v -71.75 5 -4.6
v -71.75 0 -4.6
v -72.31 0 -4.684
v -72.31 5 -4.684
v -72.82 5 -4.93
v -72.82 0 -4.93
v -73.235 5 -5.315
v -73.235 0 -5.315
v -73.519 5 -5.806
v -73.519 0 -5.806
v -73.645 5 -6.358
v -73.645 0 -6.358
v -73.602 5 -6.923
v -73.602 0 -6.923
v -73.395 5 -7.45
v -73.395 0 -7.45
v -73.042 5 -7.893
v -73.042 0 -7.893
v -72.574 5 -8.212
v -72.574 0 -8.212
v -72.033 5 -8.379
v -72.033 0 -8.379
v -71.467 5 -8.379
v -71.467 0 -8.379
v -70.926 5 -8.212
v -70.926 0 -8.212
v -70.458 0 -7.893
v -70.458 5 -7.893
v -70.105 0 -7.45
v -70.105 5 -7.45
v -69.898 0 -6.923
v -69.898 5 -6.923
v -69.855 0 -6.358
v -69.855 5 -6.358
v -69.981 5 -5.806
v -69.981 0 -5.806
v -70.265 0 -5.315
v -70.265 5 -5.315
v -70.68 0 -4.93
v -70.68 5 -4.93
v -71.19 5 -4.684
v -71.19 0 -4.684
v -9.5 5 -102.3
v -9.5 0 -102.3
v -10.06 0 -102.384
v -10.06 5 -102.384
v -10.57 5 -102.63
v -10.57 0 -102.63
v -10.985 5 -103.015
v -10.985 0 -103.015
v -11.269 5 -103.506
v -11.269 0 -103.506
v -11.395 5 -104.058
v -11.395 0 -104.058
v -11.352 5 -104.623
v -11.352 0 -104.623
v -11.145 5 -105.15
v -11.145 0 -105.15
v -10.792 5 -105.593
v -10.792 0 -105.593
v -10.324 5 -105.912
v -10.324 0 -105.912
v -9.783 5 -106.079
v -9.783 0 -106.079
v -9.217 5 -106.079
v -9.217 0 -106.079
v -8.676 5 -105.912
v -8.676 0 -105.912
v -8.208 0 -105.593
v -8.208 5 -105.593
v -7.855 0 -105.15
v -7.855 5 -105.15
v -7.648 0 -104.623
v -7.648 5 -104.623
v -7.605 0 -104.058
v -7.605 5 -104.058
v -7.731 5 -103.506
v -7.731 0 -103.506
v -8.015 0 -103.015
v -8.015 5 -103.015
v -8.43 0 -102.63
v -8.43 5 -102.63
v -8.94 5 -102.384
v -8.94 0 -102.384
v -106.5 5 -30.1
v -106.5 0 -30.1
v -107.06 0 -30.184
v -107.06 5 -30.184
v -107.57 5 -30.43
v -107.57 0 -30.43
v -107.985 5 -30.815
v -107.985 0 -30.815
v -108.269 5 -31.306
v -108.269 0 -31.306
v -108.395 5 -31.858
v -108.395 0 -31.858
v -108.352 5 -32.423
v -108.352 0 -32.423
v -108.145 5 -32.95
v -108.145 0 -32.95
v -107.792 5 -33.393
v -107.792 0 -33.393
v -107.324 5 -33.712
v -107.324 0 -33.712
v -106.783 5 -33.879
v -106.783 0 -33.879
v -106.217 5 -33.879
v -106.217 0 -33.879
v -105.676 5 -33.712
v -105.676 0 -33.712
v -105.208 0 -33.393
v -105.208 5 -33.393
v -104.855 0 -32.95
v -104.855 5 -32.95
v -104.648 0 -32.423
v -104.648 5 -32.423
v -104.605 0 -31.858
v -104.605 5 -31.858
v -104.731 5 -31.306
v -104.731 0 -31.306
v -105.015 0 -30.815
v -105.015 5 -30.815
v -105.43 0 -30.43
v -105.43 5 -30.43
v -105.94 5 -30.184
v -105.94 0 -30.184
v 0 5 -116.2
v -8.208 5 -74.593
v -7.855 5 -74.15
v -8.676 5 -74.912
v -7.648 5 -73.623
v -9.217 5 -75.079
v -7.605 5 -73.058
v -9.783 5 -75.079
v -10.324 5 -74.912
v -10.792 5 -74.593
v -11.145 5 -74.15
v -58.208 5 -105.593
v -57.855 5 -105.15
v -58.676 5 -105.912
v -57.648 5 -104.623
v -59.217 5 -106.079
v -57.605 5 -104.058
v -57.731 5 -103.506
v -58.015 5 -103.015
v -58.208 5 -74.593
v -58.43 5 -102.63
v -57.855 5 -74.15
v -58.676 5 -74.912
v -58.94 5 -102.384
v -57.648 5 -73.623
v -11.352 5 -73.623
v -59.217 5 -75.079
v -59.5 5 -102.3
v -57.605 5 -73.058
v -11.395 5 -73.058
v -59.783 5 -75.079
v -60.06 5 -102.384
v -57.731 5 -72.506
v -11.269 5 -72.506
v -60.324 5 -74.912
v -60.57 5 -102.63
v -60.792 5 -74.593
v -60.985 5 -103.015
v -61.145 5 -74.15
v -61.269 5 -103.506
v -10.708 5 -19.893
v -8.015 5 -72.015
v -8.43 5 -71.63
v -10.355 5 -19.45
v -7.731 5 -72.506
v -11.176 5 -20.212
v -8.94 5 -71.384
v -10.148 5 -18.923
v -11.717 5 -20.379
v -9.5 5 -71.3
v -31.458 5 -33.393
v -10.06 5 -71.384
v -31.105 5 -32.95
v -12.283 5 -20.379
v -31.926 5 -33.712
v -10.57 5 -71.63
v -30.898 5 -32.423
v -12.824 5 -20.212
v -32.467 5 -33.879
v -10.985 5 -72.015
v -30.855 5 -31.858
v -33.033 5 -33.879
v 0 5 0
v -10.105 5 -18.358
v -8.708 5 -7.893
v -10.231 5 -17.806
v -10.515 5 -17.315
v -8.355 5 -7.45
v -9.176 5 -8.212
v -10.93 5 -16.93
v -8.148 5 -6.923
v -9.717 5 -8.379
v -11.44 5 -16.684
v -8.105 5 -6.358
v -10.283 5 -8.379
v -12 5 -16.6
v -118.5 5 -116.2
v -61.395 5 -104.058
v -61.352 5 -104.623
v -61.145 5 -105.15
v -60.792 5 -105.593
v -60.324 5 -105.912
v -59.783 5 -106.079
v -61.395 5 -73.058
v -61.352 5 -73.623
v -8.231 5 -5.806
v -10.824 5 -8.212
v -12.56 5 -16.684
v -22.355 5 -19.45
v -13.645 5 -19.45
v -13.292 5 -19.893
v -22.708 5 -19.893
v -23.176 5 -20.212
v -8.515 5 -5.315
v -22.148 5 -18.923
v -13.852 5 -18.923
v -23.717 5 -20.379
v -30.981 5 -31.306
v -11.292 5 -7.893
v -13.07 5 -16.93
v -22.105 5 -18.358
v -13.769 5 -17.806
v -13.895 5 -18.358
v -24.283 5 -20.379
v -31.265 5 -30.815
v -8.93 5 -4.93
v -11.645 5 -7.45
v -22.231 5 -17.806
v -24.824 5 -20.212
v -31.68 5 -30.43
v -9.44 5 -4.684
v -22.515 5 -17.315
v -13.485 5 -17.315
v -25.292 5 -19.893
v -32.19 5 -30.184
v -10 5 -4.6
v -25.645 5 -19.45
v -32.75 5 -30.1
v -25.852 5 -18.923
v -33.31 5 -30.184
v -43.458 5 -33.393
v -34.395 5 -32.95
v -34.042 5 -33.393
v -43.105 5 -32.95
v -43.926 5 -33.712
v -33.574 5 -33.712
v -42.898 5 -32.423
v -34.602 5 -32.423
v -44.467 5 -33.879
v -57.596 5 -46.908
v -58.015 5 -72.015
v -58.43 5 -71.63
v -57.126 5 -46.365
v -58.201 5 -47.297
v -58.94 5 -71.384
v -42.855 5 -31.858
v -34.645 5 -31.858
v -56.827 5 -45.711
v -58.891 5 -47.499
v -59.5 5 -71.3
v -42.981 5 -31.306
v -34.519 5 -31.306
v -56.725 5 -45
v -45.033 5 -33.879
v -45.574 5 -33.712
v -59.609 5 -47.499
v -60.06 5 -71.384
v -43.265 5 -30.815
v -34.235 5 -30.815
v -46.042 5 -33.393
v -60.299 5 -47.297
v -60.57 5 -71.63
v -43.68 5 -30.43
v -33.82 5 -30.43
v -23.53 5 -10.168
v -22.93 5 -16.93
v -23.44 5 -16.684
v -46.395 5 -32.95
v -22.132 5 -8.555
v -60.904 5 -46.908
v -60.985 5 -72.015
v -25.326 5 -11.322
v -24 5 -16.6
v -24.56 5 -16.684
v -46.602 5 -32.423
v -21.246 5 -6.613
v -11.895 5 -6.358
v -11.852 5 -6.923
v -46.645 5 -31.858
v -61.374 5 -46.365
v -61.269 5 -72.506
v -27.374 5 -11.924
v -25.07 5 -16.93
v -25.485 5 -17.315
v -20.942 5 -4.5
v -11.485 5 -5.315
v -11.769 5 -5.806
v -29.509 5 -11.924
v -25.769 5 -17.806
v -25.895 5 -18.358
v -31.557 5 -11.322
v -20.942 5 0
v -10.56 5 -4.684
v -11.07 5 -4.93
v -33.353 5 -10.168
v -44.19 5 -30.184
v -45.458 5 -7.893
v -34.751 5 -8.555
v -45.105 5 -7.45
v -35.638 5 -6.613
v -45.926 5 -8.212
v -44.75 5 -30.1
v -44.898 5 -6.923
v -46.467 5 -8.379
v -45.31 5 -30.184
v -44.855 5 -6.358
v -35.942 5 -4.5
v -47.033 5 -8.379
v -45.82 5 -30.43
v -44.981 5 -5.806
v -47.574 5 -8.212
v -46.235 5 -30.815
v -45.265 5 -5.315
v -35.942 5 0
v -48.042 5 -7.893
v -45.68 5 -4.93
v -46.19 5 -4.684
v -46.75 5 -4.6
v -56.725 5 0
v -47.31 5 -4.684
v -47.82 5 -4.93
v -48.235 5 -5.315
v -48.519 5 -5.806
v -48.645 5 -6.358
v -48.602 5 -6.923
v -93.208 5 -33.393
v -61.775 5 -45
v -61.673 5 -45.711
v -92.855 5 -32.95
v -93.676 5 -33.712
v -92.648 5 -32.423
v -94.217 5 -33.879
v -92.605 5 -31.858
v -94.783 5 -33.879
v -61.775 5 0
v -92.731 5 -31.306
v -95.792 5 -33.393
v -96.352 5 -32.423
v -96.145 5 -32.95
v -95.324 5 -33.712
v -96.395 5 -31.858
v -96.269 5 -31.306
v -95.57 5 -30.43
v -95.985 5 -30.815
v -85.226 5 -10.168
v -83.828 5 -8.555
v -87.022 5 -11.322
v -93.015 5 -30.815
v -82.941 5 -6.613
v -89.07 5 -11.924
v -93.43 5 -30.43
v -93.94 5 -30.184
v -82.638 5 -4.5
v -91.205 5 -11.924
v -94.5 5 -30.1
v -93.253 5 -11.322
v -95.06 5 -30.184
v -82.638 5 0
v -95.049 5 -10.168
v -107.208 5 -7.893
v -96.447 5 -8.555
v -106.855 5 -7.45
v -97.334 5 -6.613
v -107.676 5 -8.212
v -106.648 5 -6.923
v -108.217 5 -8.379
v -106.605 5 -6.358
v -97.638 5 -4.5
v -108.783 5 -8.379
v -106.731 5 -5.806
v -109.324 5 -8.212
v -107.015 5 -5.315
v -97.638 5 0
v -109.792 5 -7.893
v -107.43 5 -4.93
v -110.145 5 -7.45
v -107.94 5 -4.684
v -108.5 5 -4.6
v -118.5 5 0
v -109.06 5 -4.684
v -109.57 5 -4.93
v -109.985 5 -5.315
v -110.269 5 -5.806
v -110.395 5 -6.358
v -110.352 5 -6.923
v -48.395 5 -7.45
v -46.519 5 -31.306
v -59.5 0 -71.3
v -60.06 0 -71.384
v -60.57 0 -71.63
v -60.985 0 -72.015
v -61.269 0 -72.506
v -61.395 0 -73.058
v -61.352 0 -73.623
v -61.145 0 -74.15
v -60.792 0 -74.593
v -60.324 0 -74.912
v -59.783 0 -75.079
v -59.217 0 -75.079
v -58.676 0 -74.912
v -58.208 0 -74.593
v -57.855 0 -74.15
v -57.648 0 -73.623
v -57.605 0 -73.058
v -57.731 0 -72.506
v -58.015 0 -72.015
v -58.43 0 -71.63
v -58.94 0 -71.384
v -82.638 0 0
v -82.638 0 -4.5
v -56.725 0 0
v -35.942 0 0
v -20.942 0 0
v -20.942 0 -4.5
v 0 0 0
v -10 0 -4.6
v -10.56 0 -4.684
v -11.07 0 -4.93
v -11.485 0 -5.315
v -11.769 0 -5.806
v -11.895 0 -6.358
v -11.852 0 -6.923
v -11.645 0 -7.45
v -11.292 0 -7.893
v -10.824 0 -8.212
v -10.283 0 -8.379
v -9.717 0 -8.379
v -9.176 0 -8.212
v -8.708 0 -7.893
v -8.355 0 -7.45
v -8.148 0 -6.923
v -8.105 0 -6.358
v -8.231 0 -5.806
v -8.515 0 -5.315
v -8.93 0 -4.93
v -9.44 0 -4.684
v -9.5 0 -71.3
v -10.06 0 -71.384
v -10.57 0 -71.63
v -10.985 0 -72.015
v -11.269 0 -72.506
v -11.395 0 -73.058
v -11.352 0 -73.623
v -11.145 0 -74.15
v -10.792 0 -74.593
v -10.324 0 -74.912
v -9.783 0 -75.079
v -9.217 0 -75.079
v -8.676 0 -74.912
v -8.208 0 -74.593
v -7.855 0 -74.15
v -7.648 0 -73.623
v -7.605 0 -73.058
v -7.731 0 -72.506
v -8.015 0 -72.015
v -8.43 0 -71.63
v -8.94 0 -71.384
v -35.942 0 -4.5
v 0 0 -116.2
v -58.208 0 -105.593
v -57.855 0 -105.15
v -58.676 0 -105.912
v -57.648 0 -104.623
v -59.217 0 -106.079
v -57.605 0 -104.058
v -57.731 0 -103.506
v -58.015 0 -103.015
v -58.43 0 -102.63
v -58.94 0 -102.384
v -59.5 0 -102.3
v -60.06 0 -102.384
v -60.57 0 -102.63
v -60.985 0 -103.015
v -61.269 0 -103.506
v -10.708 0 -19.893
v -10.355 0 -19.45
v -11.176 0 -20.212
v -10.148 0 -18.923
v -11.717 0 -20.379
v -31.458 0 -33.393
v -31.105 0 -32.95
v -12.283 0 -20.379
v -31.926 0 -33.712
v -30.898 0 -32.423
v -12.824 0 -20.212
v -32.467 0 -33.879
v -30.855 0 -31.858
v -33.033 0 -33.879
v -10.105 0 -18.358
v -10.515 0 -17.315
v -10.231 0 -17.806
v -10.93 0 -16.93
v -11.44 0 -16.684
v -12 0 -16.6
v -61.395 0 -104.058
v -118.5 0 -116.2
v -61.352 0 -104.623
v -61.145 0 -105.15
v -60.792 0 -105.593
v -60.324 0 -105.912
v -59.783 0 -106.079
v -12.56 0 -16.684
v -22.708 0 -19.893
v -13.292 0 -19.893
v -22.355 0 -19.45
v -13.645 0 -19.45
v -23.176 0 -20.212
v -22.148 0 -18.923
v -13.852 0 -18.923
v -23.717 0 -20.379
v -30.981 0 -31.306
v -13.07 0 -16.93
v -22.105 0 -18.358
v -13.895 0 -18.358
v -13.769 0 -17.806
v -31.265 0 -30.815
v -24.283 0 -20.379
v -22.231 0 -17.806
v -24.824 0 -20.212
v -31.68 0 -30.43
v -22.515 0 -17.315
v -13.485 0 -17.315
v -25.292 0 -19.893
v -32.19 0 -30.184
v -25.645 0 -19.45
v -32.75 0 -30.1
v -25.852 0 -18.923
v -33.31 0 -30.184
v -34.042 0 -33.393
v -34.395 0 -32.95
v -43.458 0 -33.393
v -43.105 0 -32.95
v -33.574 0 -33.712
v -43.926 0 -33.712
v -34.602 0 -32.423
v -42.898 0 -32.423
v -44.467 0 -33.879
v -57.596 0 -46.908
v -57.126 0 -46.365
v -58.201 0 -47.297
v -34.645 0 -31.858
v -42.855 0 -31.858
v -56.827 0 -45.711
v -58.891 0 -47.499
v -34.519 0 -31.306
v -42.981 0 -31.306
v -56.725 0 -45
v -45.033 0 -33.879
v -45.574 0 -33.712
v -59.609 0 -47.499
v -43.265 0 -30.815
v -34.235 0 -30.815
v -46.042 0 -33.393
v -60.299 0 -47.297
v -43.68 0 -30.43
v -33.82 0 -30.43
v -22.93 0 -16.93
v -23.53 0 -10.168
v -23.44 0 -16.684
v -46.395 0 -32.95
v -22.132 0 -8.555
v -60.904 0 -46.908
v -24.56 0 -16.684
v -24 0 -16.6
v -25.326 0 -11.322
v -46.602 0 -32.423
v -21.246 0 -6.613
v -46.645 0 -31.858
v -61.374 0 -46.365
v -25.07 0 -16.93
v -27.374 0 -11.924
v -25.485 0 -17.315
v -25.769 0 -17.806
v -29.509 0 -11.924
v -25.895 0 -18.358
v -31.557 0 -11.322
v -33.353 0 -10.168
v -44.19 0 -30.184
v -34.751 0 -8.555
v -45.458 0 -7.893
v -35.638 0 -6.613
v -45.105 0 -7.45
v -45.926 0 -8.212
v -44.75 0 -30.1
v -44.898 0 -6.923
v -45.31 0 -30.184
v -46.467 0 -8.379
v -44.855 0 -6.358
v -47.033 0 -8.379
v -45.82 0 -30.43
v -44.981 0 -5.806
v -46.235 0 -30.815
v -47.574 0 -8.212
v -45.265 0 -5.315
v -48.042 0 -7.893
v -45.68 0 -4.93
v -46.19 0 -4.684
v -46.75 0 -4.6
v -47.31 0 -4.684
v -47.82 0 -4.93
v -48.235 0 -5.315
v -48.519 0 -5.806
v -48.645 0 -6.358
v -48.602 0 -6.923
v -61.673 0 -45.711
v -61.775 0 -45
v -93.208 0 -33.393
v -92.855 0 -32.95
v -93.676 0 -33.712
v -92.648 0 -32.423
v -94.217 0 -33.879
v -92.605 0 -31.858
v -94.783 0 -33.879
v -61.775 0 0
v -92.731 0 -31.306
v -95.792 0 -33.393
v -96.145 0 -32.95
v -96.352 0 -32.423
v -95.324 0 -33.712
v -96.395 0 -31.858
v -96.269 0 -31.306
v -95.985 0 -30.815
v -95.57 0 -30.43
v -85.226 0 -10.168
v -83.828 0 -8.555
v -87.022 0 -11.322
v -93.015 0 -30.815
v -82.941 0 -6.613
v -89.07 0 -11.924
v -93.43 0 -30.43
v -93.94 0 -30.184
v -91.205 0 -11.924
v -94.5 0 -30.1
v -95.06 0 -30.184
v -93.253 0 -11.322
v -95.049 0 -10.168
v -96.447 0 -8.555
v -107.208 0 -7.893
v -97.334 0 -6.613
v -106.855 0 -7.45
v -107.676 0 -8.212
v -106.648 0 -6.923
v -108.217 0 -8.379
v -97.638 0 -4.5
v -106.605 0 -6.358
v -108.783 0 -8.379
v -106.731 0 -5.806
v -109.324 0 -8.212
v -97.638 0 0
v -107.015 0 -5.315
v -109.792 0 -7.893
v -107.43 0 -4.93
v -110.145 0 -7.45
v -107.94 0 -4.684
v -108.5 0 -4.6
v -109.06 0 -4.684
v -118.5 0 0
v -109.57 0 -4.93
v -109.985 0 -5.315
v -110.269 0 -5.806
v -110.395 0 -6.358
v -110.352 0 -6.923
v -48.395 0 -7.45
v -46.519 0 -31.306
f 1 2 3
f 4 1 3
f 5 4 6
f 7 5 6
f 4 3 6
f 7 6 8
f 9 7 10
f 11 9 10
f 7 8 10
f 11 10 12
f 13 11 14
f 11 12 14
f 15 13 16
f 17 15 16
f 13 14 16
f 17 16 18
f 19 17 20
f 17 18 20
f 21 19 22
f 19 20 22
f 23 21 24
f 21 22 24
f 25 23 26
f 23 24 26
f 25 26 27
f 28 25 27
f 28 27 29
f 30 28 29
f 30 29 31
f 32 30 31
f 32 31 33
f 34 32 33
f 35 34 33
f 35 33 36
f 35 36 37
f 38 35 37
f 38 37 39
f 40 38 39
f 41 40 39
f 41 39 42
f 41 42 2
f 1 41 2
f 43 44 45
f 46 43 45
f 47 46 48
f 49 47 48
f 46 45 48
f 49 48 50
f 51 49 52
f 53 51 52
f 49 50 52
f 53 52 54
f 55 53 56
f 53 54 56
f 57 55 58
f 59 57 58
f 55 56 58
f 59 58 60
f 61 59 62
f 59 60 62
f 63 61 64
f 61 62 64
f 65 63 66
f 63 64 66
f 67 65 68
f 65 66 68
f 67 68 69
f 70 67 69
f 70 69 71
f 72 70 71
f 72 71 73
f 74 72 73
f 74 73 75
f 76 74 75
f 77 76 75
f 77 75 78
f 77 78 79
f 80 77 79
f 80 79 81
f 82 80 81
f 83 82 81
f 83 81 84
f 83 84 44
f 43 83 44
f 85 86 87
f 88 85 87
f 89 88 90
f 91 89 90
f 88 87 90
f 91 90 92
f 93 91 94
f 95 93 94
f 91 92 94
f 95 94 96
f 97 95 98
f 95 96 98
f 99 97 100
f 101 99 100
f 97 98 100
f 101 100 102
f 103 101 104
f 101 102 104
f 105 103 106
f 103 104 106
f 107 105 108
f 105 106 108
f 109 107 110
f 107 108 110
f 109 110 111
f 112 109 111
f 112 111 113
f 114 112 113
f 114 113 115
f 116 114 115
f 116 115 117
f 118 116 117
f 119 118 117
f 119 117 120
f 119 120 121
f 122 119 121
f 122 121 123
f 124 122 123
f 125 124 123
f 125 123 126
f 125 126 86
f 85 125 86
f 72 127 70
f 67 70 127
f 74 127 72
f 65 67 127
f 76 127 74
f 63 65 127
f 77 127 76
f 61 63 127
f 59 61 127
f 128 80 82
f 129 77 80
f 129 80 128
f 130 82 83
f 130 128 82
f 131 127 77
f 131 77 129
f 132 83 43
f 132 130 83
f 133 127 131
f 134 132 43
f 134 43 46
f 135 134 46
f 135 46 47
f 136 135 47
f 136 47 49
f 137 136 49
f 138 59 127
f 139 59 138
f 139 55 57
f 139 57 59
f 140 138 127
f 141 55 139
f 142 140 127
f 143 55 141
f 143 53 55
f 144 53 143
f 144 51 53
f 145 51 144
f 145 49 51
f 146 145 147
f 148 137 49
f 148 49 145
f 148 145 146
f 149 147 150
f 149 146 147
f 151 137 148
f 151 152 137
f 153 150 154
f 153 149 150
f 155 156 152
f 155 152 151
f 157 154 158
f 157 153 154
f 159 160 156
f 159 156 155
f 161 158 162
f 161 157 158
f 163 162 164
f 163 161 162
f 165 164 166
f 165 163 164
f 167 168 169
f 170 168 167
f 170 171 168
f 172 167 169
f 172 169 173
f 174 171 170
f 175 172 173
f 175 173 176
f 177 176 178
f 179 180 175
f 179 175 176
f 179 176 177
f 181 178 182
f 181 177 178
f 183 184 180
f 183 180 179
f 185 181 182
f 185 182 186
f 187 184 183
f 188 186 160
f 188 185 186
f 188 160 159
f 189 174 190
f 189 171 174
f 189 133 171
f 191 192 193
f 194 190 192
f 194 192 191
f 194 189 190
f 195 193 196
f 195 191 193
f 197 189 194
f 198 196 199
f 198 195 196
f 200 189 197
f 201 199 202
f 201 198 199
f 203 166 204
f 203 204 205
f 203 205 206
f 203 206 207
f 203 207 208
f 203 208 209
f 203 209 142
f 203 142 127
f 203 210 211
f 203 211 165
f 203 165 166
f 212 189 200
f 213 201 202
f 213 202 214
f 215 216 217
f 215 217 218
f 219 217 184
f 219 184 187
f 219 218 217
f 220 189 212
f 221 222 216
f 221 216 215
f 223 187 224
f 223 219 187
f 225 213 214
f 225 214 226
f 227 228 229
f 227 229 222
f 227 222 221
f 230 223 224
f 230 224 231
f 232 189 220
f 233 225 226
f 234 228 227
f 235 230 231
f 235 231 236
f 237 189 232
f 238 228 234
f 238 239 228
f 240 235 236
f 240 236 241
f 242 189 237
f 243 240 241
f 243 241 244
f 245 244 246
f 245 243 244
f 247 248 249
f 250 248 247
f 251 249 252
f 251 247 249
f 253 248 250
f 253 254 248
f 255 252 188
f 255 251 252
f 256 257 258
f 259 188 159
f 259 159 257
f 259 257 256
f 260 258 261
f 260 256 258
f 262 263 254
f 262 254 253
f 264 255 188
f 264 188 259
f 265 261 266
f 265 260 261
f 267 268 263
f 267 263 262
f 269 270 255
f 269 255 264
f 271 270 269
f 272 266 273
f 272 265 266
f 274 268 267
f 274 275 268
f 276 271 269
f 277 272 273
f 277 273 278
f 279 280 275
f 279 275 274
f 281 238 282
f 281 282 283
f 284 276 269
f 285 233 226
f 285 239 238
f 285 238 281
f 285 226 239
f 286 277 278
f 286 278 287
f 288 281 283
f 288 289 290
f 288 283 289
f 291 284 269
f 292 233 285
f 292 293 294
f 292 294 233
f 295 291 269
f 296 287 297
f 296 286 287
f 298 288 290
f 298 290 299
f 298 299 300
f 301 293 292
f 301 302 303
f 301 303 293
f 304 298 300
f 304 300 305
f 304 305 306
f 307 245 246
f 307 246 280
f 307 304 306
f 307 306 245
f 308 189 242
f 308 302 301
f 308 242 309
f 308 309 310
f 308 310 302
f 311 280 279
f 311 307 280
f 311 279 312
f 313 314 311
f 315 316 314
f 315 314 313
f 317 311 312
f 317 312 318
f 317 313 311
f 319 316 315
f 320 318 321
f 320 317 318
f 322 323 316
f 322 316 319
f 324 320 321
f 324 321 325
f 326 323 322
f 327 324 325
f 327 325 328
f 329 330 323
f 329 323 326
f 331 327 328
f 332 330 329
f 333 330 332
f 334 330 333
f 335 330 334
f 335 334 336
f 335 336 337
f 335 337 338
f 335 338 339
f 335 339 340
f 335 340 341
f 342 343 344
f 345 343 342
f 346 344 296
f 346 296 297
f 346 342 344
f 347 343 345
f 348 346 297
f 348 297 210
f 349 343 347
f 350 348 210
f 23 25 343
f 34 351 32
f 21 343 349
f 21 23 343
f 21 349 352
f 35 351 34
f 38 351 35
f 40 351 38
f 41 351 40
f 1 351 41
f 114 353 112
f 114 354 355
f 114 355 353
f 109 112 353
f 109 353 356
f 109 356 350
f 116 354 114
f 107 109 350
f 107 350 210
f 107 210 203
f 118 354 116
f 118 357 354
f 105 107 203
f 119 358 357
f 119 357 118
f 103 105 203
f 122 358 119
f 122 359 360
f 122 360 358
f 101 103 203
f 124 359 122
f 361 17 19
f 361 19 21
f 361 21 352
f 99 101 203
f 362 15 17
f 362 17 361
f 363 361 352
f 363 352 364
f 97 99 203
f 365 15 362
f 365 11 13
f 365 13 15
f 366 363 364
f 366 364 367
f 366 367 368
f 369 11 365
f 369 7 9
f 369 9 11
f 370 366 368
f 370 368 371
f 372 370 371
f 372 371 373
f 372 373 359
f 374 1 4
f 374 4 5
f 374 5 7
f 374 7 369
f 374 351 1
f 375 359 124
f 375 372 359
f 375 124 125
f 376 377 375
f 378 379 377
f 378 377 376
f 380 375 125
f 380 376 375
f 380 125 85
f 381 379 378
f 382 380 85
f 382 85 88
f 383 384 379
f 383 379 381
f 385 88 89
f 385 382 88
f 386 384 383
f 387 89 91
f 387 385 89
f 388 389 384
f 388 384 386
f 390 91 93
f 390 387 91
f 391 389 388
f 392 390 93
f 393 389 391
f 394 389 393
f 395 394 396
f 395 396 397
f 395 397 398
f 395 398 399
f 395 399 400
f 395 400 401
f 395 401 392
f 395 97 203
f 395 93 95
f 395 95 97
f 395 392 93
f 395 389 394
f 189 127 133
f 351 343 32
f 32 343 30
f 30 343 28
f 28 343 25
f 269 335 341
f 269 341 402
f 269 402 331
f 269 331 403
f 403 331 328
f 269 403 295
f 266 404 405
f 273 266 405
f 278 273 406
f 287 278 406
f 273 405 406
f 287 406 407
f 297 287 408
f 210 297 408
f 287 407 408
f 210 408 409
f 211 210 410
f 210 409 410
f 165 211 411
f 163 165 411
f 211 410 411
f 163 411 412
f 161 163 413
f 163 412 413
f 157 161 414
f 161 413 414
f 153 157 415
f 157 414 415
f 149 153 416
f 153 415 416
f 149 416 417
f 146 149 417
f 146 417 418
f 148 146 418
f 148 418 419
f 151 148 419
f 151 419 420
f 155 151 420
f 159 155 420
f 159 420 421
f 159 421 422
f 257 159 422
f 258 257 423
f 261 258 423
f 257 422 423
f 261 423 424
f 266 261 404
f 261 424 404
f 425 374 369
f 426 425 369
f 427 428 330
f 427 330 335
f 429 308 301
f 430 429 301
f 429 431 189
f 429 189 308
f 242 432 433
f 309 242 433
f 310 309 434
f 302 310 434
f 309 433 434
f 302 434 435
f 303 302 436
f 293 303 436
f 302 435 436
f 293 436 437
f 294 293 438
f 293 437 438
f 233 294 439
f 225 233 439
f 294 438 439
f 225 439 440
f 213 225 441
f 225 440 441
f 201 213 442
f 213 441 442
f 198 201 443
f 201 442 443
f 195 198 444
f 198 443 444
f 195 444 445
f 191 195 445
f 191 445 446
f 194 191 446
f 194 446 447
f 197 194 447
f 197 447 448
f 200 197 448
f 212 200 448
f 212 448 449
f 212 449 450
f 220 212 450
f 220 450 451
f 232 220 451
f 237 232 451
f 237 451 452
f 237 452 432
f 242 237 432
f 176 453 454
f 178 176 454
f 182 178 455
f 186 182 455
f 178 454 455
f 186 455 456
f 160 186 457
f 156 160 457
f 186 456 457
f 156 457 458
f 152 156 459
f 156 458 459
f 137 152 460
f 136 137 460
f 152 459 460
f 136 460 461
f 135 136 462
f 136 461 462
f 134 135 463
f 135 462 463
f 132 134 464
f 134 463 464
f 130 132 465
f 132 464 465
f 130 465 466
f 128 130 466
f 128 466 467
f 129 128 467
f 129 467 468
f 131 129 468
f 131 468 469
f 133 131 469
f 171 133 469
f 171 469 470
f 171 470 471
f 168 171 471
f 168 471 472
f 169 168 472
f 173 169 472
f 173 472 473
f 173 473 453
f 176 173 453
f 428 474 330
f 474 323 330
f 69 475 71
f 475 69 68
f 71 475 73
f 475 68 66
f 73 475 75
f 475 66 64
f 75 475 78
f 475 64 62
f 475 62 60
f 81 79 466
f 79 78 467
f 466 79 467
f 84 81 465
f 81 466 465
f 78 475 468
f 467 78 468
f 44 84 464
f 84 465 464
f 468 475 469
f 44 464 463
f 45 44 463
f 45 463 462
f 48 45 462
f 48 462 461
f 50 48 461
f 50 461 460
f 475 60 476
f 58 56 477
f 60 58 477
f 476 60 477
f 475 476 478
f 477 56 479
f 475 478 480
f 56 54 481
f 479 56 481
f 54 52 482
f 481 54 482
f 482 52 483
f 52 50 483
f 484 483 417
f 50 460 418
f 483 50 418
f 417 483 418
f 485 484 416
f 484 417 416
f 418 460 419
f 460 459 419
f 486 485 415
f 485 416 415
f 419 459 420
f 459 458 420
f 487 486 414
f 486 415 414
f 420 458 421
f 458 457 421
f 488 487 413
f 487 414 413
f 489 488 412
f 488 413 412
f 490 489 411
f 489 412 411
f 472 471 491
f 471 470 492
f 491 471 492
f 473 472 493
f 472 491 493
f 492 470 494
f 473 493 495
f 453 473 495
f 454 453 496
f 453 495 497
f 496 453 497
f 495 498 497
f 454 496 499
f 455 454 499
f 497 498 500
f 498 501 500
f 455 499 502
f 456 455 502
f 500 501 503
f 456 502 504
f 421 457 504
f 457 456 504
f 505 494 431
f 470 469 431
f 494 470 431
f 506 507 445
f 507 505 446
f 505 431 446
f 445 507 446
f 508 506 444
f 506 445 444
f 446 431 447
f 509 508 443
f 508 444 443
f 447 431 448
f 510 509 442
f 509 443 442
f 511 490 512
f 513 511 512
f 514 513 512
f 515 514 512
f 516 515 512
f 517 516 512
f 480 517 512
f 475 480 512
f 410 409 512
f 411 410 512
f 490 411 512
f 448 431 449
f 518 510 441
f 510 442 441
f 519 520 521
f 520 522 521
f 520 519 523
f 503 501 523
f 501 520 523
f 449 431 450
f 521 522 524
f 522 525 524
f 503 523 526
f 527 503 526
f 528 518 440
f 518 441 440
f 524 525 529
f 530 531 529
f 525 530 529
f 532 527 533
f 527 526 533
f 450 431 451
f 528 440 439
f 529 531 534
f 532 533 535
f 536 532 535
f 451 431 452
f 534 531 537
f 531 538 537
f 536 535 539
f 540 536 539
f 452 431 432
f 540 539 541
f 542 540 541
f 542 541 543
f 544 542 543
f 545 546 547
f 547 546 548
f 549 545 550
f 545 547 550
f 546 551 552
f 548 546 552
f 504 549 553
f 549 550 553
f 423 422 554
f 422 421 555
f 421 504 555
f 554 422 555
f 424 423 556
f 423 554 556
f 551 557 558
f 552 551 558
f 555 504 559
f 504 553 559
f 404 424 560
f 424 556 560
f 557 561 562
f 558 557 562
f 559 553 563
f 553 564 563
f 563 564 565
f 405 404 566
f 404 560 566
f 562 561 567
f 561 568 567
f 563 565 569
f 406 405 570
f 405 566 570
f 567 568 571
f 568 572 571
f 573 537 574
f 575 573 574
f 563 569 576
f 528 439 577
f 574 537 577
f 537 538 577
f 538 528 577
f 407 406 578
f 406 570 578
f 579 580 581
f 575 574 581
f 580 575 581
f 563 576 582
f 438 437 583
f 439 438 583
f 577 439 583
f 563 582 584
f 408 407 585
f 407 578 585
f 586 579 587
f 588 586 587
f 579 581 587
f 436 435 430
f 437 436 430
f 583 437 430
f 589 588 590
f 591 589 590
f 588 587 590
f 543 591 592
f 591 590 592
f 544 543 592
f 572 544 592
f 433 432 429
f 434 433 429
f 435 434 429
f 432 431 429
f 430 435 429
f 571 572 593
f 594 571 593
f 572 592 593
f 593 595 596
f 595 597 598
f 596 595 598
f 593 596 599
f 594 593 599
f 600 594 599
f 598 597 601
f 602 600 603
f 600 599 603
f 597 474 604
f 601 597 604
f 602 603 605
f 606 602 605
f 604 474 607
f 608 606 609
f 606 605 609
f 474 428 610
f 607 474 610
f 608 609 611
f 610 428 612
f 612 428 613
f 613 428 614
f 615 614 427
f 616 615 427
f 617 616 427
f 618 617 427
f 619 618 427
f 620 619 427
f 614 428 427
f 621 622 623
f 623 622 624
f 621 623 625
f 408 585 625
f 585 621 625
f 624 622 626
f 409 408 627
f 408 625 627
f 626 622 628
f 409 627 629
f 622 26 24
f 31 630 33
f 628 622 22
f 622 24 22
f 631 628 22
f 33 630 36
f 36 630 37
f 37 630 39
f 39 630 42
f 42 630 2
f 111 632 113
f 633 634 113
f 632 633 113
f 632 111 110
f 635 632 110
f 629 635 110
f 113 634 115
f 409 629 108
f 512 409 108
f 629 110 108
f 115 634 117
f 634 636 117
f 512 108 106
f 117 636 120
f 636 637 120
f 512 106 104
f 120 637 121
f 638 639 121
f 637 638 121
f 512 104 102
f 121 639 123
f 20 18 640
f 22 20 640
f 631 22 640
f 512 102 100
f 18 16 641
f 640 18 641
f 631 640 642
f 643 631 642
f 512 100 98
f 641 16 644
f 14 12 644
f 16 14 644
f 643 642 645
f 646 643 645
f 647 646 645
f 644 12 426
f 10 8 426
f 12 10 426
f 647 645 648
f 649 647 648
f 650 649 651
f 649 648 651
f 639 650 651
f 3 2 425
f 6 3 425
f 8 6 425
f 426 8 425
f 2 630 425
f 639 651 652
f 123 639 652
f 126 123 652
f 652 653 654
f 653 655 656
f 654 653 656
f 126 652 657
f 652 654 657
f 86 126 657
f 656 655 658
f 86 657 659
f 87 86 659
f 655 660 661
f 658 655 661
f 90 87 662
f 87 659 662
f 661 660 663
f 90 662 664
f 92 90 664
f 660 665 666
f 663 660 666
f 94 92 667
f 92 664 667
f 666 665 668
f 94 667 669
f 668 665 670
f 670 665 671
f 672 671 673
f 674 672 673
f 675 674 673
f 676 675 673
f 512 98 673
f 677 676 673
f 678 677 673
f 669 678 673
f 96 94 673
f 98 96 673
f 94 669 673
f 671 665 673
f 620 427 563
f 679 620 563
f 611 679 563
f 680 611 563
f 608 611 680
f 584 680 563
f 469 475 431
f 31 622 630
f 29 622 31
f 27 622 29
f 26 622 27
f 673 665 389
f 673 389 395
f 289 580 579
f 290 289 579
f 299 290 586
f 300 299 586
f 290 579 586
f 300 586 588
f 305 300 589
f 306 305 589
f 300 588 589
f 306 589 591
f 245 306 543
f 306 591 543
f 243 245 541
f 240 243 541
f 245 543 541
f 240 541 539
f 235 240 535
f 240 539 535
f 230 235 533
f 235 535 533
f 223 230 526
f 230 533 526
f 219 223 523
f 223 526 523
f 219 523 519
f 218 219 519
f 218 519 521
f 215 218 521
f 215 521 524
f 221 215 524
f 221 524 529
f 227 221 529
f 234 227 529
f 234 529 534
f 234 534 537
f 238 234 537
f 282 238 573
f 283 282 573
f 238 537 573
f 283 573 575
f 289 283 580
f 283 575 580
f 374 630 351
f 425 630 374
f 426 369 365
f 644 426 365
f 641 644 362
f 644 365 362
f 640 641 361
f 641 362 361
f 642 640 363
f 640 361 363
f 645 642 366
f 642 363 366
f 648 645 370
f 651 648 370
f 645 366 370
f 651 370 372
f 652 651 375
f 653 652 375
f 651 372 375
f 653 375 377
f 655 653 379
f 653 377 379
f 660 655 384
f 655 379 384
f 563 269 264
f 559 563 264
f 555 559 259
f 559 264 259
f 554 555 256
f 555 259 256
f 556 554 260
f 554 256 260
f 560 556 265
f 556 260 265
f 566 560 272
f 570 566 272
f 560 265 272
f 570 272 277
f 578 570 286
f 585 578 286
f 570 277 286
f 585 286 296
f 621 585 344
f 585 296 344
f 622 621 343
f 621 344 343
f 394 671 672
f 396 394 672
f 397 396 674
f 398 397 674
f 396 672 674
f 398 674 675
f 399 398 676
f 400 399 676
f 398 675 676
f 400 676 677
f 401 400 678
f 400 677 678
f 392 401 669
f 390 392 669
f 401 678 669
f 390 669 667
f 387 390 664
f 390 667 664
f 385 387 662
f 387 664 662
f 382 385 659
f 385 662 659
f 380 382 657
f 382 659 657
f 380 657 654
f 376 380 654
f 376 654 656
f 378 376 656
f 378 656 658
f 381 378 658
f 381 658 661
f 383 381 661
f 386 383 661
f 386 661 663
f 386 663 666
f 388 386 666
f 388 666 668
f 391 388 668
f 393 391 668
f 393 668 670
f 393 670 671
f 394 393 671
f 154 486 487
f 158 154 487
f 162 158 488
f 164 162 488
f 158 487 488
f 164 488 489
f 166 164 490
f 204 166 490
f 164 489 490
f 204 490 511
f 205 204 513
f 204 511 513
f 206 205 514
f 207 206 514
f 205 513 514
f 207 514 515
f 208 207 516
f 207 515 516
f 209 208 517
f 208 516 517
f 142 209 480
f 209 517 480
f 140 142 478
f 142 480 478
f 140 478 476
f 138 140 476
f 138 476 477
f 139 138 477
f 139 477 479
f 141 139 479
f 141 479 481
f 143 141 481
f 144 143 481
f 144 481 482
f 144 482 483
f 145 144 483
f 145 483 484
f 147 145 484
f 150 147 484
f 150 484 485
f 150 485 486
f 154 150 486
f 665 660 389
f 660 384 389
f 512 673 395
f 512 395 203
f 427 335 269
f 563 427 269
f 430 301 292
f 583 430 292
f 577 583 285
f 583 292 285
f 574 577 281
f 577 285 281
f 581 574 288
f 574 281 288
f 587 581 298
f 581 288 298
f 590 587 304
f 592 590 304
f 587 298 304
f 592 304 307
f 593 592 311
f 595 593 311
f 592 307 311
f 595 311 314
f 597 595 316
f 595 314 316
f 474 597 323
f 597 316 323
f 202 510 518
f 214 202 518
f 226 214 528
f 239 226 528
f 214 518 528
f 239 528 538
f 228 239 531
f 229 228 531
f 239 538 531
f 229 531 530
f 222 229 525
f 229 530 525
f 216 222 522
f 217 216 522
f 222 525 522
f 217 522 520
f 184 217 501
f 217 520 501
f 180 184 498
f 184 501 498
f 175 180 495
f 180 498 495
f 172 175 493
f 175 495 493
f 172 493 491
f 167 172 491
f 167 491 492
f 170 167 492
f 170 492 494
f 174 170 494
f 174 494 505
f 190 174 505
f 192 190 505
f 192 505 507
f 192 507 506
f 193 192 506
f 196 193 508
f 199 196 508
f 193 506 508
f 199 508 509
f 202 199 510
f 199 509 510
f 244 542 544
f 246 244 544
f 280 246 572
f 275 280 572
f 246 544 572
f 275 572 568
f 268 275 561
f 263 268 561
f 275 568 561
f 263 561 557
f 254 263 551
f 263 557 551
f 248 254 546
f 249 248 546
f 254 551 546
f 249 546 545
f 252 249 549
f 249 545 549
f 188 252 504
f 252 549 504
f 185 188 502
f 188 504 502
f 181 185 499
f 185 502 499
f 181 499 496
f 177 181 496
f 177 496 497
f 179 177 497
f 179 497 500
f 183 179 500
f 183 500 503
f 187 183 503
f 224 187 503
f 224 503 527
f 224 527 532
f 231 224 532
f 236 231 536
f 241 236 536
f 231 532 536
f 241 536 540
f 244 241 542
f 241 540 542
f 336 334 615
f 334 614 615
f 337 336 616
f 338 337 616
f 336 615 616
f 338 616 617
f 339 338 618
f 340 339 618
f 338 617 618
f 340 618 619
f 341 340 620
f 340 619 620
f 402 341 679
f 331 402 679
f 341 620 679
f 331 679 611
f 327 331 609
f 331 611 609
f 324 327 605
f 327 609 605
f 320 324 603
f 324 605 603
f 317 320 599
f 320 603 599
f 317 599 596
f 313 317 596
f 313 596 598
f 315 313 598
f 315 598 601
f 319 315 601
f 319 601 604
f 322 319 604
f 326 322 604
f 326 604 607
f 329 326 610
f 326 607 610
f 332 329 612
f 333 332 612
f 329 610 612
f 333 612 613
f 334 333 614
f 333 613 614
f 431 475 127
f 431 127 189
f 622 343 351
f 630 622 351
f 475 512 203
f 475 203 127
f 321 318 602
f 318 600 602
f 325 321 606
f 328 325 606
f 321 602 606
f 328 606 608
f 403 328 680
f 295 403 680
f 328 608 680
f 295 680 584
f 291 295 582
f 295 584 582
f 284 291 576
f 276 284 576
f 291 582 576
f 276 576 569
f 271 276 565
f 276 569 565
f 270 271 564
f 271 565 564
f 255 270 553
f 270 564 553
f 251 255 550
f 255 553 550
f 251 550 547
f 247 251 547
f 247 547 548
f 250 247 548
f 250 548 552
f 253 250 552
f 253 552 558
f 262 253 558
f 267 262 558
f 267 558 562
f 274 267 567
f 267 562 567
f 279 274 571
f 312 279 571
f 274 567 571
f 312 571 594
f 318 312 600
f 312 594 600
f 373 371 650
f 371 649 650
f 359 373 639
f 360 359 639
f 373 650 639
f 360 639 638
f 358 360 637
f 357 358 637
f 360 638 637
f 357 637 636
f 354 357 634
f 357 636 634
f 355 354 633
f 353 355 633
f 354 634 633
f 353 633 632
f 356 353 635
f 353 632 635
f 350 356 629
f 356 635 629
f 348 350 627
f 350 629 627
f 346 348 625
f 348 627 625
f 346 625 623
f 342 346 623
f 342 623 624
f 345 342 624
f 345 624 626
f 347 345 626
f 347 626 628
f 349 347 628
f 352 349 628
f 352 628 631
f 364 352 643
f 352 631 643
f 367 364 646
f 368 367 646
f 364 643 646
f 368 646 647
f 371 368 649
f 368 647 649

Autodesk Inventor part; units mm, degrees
ref_plane "YZ Plane" through (0, 0, 0) normal (1, 0, 0) x (0, 1, 0)
ref_plane "XZ Plane" through (0, 0, 0) normal (0, 1, 0) x (-1, 0, 0)
ref_plane "XY Plane" through (0, 0, 0) normal (0, 0, 1) x (1, 0, 0)
sketch "Sketch1" plane through (0, 0, 0) normal (0, 1, 0) x (-1, 0, 0)
  line L0 (0, 0) -> (118.5, 0)
  line L1 (118.5, 0) -> (118.5, -116.2)
  line L2 (118.5, -116.2) -> (0, -116.2)
  line L3 (0, -116.2) -> (0, 0)
  dimension "d0" = 118.5
  dimension "d1" = 116.2
extrude "Extrusion1" add sketch "Sketch1" along normal blind 5
sketch "Sketch2" plane through (0, 5, 0) normal (0, 1, 0) x (1, 0, 0)
  line L0 (-59.5, 73.2) -> (-9.5, 73.2)
  line L1 (-9.5, 73.2) -> (-9.5, 104.2)
  line L2 (-9.5, 104.2) -> (-59.5, 104.2)
  line L3 (-59.5, 104.2) -> (-59.5, 73.2)
  line L4 (0, 116.2) -> (-118.5, 116.2) projected
  line L5 (-118.5, 116.2) -> (-118.5, 0) projected
  point P0 (0, 0)
  dimension "d4" = 12
  dimension "d5" = 31
  dimension "d6" = 50
  dimension "d7" = 59
hole "Hole1" at (-59.5, 5, -73.2) at (-9.5, 5, -73.2) at (-59.5, 5, -104.2) at (-9.5, 5, -104.2) direction (0, -1, 0) diameter 3.8 end through all
sketch "Sketch3" plane through (0, 5, 0) normal (0, 1, 0) x (1, 0, 0)
  line L0 (-59.25, -19.9196) -> (-59.25, 121.041) construction
  line L1 (-118.5, 0) -> (0, 0) projected
  line L2 (-61.775, 0) -> (-56.725, 0)
  line L3 (-56.725, 0) -> (-56.725, 45)
  line L4 (-61.775, 45) -> (-61.775, 0)
  arc A0 (-56.725, 45) -> (-61.775, 45) centre (-59.25, 45) ccw
  point P0 (-59.25, 0)
  dimension "d18" = 5.05
  dimension "d19" = 45
extrude "Extrusion2" cut sketch "Sketch3" against normal blind 10
sketch "Sketch4" plane through (0, 5, 0) normal (0, 1, 0) x (1, 0, 0)
  line L0 (-148.0192, 32) -> (31.7399, 32) construction
  line L1 (-56.725, 0) -> (0, 0) construction
  line L2 (-118.5, 116.2) -> (-118.5, 0) construction
  line L3 (-59.25, 61.4977) -> (-59.25, -14.0332) construction
  line L4 (-61.775, 45) -> (-61.775, 0) construction
  arc A0 (-56.725, 45) -> (-61.775, 45) centre (-59.25, 45) ccw construction
  line L5 (-27.032, 18.5) -> (18.1948, 18.5) construction
  line L6 (0, 0) -> (0, 116.2) construction
  point P0 (-106.5, 32)
  point P1 (-94.5, 32)
  point P2 (-44.75, 32)
  point P3 (-32.75, 32)
  point P4 (-59.25, 47.525)
  point P5 (-12, 18.5)
  point P6 (-24, 18.5)
  dimension "d22" = 32
  dimension "d23" = 12
  dimension "d24" = 12
  dimension "d25" = 12
  dimension "d26" = 14.5
  dimension "d27" = 18.5
  dimension "d28" = 12
  dimension "d29" = 12
hole "Hole2" at (-106.5, 5, -32) at (-94.5, 5, -32) at (-44.75, 5, -32) at (-32.75, 5, -32) at (-12, 5, -18.5) at (-24, 5, -18.5) direction (0, -1, 0) diameter 3.8 end through all
sketch "Sketch5" plane through (0, 5, 0) normal (0, 1, 0) x (1, 0, 0)
  line L0 (-134.8767, 6.5) -> (26.057, 6.5) construction
  line L1 (-56.725, 0) -> (0, 0) construction
  line L2 (0, 0) -> (0, 116.2) construction
  line L3 (-118.5, 116.2) -> (-118.5, 0) construction
  line L4 (-59.25, 58.1) -> (-59.25, -13.4303) construction
  arc A0 (-56.725, 45) -> (-61.775, 45) centre (-59.25, 45) ccw construction
  point P0 (-108.5, 6.5)
  point P1 (-71.75, 6.5)
  point P2 (-46.75, 6.5)
  point P3 (-10, 6.5)
  point P4 (-59.25, 47.525)
  dimension "d37" = 6.5
  dimension "d38" = 10
  dimension "d39" = 10
  dimension "d40" = 12.5
  dimension "d41" = 12.5
hole "Hole3" at (-108.5, 5, -6.5) at (-71.75, 5, -6.5) at (-46.75, 5, -6.5) at (-10, 5, -6.5) direction (0, -1, 0) diameter 3.8 end through all
sketch "Sketch6" plane through (0, 5, 0) normal (0, 1, 0) x (1, 0, 0)
  line L0 (-90.1375, 21.1453) -> (-90.1375, -29.1073) construction
  line L1 (-28.4418, 11.0948) -> (-28.4418, -20.2874) construction
  line L2 (-90.1375, -5.5) -> (-90.1375, 4.5) construction
  line L3 (-82.6375, -5.5) -> (-82.6375, 4.5)
  line L4 (-97.6375, 4.5) -> (-97.6375, -5.5)
  arc A0 (-97.6375, -5.5) -> (-82.6375, -5.5) centre (-90.1375, -5.5) ccw
  arc A1 (-82.6375, 4.5) -> (-97.6375, 4.5) centre (-90.1375, 4.5) ccw
  line L5 (-28.4418, -5.5) -> (-28.4418, 4.5) construction
  line L6 (-20.9418, -5.5) -> (-20.9418, 4.5)
  line L7 (-35.9418, 4.5) -> (-35.9418, -5.5)
  arc A2 (-35.9418, -5.5) -> (-20.9418, -5.5) centre (-28.4418, -5.5) ccw
  arc A3 (-20.9418, 4.5) -> (-35.9418, 4.5) centre (-28.4418, 4.5) ccw
  line L8 (-56.725, 0) -> (0, 0) projected
  line L9 (-118.5, 0) -> (-61.775, 0) projected
  line L10 (-118.5, 0) -> (-61.775, 0) projected
  line L11 (-97.6375, 0) -> (-82.6375, 0)
  line L12 (-35.9418, 0) -> (-20.9418, 0)
  point P0 (-90.1375, -0.5)
  point P1 (-28.4418, -0.5)
  point P2 (-97.6375, 0)
  point P3 (-82.6375, 0)
  dimension "d49" = 15
  dimension "d50" = 15
  dimension "d51" = 4.5
  dimension "d52" = 4.5
  dimension "d53" = 10
  dimension "d54" = 10
extrude "Extrusion3" cut sketch "Sketch6" against normal through all contours L9 L4 A1 L3 | L8 L7 A3 L6
properties part number "Battery Base Plate"
